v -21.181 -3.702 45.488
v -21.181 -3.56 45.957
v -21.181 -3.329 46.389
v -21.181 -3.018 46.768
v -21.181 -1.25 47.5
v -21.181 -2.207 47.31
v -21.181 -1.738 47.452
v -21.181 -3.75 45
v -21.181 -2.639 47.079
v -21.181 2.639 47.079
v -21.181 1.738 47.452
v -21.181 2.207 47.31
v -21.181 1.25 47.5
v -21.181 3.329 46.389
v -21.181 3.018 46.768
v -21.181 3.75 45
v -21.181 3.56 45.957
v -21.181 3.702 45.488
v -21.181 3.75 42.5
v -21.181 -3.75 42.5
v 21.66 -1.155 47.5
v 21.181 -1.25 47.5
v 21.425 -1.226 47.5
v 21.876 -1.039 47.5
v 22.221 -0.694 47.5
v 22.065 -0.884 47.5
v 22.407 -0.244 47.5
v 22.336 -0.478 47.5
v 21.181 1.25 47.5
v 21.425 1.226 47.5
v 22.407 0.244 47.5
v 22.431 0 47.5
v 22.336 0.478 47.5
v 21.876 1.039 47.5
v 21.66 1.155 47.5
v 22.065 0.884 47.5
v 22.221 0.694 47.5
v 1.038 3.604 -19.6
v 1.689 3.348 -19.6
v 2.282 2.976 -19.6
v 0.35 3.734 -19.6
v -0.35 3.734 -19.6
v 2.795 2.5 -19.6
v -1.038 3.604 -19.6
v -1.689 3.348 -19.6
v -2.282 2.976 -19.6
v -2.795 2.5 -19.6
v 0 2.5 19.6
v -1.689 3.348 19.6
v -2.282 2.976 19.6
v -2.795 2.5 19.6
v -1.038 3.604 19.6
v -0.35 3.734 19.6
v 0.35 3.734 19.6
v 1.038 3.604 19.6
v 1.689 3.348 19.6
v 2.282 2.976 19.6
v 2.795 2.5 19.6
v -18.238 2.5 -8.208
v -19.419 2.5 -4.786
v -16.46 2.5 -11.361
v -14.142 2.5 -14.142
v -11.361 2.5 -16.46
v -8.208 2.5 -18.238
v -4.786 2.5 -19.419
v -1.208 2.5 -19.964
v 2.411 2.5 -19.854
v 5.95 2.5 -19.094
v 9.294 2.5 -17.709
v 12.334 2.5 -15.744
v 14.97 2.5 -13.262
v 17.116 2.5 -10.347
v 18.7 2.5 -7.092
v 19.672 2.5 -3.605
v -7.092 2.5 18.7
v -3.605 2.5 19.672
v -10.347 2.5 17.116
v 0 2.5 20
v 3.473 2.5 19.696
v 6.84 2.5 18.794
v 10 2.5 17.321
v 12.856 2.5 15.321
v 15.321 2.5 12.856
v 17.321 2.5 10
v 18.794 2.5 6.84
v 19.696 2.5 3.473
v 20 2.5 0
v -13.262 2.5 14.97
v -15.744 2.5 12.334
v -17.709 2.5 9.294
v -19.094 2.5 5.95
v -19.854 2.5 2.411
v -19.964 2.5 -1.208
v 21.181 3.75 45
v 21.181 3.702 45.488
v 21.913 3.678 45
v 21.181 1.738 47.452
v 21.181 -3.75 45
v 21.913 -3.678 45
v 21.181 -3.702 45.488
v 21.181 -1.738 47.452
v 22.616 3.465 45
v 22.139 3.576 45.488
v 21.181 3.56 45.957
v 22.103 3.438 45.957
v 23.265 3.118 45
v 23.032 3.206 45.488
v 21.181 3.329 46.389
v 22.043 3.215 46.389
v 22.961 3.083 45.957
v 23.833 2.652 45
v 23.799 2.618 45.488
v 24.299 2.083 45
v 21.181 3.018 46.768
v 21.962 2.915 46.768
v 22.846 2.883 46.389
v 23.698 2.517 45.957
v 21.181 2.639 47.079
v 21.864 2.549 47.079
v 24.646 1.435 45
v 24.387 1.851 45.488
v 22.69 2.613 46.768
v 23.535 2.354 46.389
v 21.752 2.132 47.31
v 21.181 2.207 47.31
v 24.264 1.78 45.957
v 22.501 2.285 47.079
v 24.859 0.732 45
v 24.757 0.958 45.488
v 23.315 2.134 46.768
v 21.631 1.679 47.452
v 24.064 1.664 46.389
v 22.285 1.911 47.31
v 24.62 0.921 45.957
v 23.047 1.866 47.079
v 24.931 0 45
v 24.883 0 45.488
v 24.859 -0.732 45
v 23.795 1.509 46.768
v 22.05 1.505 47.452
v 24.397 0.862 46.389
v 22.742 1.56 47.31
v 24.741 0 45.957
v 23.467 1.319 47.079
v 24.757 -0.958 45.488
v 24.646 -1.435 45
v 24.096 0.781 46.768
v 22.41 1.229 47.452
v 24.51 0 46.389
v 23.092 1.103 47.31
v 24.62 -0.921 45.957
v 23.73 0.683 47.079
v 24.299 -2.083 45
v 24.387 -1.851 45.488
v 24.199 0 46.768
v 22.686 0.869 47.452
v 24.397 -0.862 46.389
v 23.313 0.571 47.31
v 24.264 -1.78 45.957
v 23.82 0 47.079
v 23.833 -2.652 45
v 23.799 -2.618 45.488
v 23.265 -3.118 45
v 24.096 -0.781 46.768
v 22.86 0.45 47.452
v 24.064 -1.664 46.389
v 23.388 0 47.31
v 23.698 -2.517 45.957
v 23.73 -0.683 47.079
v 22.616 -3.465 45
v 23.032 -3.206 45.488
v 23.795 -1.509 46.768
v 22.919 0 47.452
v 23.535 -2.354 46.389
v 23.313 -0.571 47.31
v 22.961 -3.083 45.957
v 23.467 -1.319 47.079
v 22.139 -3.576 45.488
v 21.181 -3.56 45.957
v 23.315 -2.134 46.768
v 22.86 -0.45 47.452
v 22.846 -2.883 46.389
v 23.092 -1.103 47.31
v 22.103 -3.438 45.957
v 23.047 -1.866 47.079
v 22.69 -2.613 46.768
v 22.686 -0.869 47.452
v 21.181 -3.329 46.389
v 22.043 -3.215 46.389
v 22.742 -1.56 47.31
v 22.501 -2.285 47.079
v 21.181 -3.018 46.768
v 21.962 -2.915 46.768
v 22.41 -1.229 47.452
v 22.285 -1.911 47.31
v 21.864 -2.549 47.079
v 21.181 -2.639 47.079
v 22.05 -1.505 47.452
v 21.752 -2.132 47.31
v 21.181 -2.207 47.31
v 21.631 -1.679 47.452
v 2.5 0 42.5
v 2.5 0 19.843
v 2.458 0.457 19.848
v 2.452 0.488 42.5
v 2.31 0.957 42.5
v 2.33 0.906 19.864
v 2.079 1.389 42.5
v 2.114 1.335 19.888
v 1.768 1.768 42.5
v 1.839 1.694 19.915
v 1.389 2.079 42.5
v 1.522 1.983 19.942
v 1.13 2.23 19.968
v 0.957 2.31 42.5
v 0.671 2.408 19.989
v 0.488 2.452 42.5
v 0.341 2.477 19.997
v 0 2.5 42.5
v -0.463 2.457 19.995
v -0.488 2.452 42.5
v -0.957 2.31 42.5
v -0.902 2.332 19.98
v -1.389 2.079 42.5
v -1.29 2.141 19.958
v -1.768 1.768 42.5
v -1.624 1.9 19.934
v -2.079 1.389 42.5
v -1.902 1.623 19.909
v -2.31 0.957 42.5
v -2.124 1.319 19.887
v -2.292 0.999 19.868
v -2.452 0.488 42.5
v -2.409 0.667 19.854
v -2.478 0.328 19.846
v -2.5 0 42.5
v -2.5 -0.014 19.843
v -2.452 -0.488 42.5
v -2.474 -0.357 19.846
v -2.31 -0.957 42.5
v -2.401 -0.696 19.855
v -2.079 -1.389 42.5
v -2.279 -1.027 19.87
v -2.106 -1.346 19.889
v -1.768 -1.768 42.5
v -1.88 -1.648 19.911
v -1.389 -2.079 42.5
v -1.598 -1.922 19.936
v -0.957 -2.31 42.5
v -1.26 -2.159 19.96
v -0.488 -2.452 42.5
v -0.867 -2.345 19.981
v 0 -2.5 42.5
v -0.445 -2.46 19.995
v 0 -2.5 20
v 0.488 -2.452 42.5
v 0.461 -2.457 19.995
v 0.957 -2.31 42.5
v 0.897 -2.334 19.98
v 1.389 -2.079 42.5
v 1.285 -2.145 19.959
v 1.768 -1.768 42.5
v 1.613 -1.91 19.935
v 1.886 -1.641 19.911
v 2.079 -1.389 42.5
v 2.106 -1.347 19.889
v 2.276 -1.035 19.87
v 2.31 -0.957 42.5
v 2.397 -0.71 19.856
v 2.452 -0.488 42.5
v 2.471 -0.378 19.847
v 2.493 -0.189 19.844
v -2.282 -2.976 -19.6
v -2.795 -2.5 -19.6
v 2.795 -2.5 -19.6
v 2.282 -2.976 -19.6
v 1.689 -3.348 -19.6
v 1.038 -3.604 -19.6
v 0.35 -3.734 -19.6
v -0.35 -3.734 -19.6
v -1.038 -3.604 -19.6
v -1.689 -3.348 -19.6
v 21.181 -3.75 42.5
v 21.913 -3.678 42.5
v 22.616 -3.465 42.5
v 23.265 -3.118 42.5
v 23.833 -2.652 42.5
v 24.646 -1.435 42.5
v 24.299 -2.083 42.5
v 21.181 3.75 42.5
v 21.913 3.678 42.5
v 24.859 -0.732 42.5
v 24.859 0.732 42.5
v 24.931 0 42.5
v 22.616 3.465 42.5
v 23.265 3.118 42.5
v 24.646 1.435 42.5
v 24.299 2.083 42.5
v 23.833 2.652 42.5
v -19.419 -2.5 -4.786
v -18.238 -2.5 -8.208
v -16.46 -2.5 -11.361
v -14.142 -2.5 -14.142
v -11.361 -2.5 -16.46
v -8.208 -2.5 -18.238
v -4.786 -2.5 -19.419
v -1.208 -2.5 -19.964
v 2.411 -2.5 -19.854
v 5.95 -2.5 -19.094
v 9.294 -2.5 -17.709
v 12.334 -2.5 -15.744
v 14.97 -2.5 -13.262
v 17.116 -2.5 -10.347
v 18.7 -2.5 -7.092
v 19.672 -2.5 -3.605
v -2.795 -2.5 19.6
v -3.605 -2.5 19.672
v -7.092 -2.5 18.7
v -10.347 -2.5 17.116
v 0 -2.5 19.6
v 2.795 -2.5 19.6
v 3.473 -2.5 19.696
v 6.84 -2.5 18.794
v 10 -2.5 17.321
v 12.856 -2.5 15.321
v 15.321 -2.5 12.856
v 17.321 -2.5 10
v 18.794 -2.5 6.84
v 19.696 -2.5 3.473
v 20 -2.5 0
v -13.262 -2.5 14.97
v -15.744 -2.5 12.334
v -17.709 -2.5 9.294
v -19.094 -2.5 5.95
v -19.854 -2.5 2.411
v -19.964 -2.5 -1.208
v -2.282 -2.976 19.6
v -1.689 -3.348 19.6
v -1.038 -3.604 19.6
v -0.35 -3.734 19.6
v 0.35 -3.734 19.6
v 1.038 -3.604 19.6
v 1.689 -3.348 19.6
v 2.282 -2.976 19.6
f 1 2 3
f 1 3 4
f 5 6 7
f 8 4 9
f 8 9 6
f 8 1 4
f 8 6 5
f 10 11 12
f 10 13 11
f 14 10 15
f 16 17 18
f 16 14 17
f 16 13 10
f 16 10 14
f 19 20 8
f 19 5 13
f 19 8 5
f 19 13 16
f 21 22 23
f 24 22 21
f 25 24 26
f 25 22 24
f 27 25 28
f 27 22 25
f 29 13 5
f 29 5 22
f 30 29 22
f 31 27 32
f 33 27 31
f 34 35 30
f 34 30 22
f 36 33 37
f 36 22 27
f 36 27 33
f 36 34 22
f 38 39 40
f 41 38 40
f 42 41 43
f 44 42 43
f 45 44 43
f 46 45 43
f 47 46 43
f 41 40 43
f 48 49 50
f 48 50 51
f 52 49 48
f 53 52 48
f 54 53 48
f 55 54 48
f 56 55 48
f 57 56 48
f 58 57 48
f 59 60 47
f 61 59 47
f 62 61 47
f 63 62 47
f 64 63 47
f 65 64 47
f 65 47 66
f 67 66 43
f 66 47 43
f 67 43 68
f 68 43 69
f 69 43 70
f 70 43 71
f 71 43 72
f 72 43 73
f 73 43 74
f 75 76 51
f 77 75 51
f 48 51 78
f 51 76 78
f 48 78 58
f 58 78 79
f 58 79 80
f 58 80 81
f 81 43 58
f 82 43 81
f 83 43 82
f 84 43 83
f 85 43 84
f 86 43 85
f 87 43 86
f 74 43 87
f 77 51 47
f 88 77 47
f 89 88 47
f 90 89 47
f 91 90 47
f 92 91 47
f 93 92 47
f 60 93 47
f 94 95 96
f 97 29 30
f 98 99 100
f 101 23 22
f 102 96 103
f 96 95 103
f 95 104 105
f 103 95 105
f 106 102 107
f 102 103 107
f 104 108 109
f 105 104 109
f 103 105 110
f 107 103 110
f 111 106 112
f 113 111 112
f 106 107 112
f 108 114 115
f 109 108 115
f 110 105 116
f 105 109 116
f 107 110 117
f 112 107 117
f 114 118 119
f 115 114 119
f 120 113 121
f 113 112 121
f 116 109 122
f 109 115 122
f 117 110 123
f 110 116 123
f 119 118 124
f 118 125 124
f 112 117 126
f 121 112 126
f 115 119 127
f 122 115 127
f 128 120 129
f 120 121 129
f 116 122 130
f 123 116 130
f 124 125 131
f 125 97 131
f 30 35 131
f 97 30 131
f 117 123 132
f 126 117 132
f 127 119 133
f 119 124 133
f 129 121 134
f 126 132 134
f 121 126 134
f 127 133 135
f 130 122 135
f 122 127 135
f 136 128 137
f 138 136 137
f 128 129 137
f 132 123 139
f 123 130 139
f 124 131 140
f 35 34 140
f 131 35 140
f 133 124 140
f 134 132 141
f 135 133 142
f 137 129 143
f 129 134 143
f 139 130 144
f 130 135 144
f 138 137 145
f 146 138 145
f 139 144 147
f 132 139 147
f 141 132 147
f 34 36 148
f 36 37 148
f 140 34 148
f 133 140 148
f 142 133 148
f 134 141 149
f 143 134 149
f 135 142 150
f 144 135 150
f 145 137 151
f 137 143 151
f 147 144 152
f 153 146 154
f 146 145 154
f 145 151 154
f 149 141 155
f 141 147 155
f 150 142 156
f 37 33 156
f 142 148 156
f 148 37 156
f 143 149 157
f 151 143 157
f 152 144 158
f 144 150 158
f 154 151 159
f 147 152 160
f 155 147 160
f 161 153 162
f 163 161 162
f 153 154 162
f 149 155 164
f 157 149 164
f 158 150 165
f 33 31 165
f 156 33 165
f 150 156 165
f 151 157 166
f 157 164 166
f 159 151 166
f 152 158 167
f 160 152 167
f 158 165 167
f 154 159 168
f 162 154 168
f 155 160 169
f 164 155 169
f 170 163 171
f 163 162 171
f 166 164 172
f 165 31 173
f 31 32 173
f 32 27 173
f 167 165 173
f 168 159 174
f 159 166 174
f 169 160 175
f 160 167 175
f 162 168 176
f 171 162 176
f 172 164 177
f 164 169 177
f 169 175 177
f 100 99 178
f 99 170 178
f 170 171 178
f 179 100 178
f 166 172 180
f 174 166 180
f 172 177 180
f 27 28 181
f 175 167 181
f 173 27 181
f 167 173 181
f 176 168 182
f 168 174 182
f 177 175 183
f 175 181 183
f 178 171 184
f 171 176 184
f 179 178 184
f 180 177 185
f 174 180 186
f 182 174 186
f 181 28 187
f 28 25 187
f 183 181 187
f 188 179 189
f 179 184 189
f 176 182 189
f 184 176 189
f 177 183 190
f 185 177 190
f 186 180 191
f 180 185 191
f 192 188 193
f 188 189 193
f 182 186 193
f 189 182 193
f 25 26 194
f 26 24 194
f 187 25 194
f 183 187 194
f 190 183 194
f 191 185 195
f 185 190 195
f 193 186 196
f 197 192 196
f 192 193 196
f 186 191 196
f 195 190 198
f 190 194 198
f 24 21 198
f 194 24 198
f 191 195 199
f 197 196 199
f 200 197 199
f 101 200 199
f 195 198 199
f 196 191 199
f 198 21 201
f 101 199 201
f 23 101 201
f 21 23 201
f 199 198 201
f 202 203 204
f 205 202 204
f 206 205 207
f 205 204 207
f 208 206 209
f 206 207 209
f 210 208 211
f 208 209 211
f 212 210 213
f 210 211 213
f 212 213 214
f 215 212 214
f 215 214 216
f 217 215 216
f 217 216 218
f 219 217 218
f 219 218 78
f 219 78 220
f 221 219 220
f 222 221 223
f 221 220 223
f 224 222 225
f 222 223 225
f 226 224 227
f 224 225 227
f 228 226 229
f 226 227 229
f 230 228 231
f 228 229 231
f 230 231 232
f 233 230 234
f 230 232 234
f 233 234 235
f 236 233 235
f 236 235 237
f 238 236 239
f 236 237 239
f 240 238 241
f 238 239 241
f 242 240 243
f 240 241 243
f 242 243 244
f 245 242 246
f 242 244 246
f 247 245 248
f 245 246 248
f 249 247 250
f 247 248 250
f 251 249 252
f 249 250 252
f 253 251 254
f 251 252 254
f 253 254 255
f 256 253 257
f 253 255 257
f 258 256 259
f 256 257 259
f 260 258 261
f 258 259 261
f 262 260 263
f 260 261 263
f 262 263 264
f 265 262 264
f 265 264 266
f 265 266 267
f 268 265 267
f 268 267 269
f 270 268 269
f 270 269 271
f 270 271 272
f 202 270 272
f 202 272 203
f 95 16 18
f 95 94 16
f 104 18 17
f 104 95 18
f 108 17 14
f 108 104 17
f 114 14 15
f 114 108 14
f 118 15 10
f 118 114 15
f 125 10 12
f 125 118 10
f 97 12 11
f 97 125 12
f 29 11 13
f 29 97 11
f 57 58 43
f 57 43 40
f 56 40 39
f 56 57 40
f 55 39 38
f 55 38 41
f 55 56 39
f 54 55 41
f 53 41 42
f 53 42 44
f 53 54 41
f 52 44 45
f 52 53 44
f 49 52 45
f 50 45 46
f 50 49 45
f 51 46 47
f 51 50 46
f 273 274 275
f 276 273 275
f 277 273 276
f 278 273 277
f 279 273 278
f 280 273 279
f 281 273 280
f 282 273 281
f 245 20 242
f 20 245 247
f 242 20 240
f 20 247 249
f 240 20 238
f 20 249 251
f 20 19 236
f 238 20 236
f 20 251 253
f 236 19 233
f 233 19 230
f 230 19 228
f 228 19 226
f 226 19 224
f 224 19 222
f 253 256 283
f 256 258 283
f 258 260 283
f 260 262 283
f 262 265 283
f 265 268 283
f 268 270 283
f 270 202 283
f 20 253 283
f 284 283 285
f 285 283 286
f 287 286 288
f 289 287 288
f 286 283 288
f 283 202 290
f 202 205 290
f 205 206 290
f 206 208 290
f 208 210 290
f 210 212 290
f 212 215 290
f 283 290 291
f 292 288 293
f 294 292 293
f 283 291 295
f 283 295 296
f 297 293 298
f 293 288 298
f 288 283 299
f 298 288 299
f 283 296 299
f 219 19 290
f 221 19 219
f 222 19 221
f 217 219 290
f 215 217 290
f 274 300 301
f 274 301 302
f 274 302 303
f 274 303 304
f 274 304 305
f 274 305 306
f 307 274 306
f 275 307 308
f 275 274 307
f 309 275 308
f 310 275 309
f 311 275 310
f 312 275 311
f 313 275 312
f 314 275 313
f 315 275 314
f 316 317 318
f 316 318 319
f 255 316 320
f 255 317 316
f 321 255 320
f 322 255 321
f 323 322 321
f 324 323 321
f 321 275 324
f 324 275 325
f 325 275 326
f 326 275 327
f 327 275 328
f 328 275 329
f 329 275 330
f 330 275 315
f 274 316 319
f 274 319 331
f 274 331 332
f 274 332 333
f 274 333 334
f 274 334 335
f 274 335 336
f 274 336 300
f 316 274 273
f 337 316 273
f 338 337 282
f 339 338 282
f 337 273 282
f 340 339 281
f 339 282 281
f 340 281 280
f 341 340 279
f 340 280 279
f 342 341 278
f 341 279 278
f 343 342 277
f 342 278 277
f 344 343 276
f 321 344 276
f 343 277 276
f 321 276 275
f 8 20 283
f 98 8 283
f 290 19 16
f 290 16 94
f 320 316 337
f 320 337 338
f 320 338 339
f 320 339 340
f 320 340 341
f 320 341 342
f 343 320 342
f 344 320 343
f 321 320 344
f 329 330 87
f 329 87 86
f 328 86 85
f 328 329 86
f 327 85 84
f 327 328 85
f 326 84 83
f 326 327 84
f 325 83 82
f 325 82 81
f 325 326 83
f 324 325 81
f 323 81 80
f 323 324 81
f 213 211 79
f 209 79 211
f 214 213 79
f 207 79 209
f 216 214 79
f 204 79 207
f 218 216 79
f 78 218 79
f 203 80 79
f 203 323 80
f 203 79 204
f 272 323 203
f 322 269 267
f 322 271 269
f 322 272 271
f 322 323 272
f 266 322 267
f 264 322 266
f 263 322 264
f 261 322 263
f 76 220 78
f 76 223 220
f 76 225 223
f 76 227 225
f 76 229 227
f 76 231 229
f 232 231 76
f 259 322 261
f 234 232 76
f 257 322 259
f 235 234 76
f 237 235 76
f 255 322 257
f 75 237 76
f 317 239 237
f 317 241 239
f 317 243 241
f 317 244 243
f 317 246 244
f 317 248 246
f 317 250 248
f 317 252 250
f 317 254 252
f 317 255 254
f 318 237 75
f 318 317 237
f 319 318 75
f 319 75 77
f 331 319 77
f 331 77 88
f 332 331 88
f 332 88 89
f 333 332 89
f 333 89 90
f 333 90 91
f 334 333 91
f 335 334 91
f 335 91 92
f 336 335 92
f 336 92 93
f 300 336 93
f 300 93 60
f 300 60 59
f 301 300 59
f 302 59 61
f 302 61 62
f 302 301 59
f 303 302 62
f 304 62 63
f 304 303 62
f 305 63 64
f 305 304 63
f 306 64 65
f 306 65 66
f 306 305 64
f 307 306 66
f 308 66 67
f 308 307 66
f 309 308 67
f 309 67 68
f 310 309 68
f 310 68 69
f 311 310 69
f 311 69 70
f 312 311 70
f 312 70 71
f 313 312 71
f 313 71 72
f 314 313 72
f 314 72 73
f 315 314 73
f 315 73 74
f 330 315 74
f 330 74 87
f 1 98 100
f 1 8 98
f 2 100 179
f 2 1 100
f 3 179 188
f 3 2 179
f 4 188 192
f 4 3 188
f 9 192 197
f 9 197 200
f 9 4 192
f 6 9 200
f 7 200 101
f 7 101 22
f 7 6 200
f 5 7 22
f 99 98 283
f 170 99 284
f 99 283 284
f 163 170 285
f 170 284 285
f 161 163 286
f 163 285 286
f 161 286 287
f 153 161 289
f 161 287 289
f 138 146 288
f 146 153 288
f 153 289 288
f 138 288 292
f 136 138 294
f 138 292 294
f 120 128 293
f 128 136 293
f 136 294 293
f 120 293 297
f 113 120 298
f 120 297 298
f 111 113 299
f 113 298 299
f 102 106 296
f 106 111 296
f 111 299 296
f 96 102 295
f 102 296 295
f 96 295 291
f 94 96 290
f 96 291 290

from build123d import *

# Parameters (mm, degrees)
F0_R          = 20
F1_DEPTH      = 2.5
F2_R          = 2.5
F3_DEPTH      = 42.5
F4_W          = 42.362636
F4_H          = 7.5
F5_DEPTH      = 5
F6_R          = 2.5
F7_R          = 3.75
F8_DEPTH      = 19.6
F8_DEPTH_BACK = 19.6


with BuildPart() as f1:
    # F0 (on Front) → F1 (new body, symmetric)
    with BuildSketch(Plane.XZ):
        Circle(F0_R)
    extrude(amount=F1_DEPTH, both=True)

    # F2 (on Top) → F3 (join)
    with BuildSketch(Plane.XY):
        Circle(F2_R)
    extrude(amount=F3_DEPTH)

    # F4 (on face) → F5 (join)
    with BuildSketch(Plane.XY.offset(42.5)):
        Rectangle(F4_W, F4_H)
        with BuildLine():
            ThreePointArc((21.181318, -3.75), (24.931318, 0), (21.181318, 3.75))
            Line((21.181318, 3.75), (21.181318, -3.75))
        make_face()
    extrude(amount=F5_DEPTH)

    # F6
    f6_edges = [f1.edges().sort_by_distance(p)[0] for p in [
        (0, 3.75, 47.5),
        (0, -3.75, 47.5),
        (24.931318, 0, 47.5),
    ]]
    fillet(f6_edges, radius=F6_R)

    # F7 (on Top) → F8 (join, two sides)
    with BuildSketch(Plane.XY) as f8_sk:
        Circle(F7_R)
    extrude(amount=F8_DEPTH)
    extrude(f8_sk.sketch, amount=-F8_DEPTH_BACK)


solid = f1.part
